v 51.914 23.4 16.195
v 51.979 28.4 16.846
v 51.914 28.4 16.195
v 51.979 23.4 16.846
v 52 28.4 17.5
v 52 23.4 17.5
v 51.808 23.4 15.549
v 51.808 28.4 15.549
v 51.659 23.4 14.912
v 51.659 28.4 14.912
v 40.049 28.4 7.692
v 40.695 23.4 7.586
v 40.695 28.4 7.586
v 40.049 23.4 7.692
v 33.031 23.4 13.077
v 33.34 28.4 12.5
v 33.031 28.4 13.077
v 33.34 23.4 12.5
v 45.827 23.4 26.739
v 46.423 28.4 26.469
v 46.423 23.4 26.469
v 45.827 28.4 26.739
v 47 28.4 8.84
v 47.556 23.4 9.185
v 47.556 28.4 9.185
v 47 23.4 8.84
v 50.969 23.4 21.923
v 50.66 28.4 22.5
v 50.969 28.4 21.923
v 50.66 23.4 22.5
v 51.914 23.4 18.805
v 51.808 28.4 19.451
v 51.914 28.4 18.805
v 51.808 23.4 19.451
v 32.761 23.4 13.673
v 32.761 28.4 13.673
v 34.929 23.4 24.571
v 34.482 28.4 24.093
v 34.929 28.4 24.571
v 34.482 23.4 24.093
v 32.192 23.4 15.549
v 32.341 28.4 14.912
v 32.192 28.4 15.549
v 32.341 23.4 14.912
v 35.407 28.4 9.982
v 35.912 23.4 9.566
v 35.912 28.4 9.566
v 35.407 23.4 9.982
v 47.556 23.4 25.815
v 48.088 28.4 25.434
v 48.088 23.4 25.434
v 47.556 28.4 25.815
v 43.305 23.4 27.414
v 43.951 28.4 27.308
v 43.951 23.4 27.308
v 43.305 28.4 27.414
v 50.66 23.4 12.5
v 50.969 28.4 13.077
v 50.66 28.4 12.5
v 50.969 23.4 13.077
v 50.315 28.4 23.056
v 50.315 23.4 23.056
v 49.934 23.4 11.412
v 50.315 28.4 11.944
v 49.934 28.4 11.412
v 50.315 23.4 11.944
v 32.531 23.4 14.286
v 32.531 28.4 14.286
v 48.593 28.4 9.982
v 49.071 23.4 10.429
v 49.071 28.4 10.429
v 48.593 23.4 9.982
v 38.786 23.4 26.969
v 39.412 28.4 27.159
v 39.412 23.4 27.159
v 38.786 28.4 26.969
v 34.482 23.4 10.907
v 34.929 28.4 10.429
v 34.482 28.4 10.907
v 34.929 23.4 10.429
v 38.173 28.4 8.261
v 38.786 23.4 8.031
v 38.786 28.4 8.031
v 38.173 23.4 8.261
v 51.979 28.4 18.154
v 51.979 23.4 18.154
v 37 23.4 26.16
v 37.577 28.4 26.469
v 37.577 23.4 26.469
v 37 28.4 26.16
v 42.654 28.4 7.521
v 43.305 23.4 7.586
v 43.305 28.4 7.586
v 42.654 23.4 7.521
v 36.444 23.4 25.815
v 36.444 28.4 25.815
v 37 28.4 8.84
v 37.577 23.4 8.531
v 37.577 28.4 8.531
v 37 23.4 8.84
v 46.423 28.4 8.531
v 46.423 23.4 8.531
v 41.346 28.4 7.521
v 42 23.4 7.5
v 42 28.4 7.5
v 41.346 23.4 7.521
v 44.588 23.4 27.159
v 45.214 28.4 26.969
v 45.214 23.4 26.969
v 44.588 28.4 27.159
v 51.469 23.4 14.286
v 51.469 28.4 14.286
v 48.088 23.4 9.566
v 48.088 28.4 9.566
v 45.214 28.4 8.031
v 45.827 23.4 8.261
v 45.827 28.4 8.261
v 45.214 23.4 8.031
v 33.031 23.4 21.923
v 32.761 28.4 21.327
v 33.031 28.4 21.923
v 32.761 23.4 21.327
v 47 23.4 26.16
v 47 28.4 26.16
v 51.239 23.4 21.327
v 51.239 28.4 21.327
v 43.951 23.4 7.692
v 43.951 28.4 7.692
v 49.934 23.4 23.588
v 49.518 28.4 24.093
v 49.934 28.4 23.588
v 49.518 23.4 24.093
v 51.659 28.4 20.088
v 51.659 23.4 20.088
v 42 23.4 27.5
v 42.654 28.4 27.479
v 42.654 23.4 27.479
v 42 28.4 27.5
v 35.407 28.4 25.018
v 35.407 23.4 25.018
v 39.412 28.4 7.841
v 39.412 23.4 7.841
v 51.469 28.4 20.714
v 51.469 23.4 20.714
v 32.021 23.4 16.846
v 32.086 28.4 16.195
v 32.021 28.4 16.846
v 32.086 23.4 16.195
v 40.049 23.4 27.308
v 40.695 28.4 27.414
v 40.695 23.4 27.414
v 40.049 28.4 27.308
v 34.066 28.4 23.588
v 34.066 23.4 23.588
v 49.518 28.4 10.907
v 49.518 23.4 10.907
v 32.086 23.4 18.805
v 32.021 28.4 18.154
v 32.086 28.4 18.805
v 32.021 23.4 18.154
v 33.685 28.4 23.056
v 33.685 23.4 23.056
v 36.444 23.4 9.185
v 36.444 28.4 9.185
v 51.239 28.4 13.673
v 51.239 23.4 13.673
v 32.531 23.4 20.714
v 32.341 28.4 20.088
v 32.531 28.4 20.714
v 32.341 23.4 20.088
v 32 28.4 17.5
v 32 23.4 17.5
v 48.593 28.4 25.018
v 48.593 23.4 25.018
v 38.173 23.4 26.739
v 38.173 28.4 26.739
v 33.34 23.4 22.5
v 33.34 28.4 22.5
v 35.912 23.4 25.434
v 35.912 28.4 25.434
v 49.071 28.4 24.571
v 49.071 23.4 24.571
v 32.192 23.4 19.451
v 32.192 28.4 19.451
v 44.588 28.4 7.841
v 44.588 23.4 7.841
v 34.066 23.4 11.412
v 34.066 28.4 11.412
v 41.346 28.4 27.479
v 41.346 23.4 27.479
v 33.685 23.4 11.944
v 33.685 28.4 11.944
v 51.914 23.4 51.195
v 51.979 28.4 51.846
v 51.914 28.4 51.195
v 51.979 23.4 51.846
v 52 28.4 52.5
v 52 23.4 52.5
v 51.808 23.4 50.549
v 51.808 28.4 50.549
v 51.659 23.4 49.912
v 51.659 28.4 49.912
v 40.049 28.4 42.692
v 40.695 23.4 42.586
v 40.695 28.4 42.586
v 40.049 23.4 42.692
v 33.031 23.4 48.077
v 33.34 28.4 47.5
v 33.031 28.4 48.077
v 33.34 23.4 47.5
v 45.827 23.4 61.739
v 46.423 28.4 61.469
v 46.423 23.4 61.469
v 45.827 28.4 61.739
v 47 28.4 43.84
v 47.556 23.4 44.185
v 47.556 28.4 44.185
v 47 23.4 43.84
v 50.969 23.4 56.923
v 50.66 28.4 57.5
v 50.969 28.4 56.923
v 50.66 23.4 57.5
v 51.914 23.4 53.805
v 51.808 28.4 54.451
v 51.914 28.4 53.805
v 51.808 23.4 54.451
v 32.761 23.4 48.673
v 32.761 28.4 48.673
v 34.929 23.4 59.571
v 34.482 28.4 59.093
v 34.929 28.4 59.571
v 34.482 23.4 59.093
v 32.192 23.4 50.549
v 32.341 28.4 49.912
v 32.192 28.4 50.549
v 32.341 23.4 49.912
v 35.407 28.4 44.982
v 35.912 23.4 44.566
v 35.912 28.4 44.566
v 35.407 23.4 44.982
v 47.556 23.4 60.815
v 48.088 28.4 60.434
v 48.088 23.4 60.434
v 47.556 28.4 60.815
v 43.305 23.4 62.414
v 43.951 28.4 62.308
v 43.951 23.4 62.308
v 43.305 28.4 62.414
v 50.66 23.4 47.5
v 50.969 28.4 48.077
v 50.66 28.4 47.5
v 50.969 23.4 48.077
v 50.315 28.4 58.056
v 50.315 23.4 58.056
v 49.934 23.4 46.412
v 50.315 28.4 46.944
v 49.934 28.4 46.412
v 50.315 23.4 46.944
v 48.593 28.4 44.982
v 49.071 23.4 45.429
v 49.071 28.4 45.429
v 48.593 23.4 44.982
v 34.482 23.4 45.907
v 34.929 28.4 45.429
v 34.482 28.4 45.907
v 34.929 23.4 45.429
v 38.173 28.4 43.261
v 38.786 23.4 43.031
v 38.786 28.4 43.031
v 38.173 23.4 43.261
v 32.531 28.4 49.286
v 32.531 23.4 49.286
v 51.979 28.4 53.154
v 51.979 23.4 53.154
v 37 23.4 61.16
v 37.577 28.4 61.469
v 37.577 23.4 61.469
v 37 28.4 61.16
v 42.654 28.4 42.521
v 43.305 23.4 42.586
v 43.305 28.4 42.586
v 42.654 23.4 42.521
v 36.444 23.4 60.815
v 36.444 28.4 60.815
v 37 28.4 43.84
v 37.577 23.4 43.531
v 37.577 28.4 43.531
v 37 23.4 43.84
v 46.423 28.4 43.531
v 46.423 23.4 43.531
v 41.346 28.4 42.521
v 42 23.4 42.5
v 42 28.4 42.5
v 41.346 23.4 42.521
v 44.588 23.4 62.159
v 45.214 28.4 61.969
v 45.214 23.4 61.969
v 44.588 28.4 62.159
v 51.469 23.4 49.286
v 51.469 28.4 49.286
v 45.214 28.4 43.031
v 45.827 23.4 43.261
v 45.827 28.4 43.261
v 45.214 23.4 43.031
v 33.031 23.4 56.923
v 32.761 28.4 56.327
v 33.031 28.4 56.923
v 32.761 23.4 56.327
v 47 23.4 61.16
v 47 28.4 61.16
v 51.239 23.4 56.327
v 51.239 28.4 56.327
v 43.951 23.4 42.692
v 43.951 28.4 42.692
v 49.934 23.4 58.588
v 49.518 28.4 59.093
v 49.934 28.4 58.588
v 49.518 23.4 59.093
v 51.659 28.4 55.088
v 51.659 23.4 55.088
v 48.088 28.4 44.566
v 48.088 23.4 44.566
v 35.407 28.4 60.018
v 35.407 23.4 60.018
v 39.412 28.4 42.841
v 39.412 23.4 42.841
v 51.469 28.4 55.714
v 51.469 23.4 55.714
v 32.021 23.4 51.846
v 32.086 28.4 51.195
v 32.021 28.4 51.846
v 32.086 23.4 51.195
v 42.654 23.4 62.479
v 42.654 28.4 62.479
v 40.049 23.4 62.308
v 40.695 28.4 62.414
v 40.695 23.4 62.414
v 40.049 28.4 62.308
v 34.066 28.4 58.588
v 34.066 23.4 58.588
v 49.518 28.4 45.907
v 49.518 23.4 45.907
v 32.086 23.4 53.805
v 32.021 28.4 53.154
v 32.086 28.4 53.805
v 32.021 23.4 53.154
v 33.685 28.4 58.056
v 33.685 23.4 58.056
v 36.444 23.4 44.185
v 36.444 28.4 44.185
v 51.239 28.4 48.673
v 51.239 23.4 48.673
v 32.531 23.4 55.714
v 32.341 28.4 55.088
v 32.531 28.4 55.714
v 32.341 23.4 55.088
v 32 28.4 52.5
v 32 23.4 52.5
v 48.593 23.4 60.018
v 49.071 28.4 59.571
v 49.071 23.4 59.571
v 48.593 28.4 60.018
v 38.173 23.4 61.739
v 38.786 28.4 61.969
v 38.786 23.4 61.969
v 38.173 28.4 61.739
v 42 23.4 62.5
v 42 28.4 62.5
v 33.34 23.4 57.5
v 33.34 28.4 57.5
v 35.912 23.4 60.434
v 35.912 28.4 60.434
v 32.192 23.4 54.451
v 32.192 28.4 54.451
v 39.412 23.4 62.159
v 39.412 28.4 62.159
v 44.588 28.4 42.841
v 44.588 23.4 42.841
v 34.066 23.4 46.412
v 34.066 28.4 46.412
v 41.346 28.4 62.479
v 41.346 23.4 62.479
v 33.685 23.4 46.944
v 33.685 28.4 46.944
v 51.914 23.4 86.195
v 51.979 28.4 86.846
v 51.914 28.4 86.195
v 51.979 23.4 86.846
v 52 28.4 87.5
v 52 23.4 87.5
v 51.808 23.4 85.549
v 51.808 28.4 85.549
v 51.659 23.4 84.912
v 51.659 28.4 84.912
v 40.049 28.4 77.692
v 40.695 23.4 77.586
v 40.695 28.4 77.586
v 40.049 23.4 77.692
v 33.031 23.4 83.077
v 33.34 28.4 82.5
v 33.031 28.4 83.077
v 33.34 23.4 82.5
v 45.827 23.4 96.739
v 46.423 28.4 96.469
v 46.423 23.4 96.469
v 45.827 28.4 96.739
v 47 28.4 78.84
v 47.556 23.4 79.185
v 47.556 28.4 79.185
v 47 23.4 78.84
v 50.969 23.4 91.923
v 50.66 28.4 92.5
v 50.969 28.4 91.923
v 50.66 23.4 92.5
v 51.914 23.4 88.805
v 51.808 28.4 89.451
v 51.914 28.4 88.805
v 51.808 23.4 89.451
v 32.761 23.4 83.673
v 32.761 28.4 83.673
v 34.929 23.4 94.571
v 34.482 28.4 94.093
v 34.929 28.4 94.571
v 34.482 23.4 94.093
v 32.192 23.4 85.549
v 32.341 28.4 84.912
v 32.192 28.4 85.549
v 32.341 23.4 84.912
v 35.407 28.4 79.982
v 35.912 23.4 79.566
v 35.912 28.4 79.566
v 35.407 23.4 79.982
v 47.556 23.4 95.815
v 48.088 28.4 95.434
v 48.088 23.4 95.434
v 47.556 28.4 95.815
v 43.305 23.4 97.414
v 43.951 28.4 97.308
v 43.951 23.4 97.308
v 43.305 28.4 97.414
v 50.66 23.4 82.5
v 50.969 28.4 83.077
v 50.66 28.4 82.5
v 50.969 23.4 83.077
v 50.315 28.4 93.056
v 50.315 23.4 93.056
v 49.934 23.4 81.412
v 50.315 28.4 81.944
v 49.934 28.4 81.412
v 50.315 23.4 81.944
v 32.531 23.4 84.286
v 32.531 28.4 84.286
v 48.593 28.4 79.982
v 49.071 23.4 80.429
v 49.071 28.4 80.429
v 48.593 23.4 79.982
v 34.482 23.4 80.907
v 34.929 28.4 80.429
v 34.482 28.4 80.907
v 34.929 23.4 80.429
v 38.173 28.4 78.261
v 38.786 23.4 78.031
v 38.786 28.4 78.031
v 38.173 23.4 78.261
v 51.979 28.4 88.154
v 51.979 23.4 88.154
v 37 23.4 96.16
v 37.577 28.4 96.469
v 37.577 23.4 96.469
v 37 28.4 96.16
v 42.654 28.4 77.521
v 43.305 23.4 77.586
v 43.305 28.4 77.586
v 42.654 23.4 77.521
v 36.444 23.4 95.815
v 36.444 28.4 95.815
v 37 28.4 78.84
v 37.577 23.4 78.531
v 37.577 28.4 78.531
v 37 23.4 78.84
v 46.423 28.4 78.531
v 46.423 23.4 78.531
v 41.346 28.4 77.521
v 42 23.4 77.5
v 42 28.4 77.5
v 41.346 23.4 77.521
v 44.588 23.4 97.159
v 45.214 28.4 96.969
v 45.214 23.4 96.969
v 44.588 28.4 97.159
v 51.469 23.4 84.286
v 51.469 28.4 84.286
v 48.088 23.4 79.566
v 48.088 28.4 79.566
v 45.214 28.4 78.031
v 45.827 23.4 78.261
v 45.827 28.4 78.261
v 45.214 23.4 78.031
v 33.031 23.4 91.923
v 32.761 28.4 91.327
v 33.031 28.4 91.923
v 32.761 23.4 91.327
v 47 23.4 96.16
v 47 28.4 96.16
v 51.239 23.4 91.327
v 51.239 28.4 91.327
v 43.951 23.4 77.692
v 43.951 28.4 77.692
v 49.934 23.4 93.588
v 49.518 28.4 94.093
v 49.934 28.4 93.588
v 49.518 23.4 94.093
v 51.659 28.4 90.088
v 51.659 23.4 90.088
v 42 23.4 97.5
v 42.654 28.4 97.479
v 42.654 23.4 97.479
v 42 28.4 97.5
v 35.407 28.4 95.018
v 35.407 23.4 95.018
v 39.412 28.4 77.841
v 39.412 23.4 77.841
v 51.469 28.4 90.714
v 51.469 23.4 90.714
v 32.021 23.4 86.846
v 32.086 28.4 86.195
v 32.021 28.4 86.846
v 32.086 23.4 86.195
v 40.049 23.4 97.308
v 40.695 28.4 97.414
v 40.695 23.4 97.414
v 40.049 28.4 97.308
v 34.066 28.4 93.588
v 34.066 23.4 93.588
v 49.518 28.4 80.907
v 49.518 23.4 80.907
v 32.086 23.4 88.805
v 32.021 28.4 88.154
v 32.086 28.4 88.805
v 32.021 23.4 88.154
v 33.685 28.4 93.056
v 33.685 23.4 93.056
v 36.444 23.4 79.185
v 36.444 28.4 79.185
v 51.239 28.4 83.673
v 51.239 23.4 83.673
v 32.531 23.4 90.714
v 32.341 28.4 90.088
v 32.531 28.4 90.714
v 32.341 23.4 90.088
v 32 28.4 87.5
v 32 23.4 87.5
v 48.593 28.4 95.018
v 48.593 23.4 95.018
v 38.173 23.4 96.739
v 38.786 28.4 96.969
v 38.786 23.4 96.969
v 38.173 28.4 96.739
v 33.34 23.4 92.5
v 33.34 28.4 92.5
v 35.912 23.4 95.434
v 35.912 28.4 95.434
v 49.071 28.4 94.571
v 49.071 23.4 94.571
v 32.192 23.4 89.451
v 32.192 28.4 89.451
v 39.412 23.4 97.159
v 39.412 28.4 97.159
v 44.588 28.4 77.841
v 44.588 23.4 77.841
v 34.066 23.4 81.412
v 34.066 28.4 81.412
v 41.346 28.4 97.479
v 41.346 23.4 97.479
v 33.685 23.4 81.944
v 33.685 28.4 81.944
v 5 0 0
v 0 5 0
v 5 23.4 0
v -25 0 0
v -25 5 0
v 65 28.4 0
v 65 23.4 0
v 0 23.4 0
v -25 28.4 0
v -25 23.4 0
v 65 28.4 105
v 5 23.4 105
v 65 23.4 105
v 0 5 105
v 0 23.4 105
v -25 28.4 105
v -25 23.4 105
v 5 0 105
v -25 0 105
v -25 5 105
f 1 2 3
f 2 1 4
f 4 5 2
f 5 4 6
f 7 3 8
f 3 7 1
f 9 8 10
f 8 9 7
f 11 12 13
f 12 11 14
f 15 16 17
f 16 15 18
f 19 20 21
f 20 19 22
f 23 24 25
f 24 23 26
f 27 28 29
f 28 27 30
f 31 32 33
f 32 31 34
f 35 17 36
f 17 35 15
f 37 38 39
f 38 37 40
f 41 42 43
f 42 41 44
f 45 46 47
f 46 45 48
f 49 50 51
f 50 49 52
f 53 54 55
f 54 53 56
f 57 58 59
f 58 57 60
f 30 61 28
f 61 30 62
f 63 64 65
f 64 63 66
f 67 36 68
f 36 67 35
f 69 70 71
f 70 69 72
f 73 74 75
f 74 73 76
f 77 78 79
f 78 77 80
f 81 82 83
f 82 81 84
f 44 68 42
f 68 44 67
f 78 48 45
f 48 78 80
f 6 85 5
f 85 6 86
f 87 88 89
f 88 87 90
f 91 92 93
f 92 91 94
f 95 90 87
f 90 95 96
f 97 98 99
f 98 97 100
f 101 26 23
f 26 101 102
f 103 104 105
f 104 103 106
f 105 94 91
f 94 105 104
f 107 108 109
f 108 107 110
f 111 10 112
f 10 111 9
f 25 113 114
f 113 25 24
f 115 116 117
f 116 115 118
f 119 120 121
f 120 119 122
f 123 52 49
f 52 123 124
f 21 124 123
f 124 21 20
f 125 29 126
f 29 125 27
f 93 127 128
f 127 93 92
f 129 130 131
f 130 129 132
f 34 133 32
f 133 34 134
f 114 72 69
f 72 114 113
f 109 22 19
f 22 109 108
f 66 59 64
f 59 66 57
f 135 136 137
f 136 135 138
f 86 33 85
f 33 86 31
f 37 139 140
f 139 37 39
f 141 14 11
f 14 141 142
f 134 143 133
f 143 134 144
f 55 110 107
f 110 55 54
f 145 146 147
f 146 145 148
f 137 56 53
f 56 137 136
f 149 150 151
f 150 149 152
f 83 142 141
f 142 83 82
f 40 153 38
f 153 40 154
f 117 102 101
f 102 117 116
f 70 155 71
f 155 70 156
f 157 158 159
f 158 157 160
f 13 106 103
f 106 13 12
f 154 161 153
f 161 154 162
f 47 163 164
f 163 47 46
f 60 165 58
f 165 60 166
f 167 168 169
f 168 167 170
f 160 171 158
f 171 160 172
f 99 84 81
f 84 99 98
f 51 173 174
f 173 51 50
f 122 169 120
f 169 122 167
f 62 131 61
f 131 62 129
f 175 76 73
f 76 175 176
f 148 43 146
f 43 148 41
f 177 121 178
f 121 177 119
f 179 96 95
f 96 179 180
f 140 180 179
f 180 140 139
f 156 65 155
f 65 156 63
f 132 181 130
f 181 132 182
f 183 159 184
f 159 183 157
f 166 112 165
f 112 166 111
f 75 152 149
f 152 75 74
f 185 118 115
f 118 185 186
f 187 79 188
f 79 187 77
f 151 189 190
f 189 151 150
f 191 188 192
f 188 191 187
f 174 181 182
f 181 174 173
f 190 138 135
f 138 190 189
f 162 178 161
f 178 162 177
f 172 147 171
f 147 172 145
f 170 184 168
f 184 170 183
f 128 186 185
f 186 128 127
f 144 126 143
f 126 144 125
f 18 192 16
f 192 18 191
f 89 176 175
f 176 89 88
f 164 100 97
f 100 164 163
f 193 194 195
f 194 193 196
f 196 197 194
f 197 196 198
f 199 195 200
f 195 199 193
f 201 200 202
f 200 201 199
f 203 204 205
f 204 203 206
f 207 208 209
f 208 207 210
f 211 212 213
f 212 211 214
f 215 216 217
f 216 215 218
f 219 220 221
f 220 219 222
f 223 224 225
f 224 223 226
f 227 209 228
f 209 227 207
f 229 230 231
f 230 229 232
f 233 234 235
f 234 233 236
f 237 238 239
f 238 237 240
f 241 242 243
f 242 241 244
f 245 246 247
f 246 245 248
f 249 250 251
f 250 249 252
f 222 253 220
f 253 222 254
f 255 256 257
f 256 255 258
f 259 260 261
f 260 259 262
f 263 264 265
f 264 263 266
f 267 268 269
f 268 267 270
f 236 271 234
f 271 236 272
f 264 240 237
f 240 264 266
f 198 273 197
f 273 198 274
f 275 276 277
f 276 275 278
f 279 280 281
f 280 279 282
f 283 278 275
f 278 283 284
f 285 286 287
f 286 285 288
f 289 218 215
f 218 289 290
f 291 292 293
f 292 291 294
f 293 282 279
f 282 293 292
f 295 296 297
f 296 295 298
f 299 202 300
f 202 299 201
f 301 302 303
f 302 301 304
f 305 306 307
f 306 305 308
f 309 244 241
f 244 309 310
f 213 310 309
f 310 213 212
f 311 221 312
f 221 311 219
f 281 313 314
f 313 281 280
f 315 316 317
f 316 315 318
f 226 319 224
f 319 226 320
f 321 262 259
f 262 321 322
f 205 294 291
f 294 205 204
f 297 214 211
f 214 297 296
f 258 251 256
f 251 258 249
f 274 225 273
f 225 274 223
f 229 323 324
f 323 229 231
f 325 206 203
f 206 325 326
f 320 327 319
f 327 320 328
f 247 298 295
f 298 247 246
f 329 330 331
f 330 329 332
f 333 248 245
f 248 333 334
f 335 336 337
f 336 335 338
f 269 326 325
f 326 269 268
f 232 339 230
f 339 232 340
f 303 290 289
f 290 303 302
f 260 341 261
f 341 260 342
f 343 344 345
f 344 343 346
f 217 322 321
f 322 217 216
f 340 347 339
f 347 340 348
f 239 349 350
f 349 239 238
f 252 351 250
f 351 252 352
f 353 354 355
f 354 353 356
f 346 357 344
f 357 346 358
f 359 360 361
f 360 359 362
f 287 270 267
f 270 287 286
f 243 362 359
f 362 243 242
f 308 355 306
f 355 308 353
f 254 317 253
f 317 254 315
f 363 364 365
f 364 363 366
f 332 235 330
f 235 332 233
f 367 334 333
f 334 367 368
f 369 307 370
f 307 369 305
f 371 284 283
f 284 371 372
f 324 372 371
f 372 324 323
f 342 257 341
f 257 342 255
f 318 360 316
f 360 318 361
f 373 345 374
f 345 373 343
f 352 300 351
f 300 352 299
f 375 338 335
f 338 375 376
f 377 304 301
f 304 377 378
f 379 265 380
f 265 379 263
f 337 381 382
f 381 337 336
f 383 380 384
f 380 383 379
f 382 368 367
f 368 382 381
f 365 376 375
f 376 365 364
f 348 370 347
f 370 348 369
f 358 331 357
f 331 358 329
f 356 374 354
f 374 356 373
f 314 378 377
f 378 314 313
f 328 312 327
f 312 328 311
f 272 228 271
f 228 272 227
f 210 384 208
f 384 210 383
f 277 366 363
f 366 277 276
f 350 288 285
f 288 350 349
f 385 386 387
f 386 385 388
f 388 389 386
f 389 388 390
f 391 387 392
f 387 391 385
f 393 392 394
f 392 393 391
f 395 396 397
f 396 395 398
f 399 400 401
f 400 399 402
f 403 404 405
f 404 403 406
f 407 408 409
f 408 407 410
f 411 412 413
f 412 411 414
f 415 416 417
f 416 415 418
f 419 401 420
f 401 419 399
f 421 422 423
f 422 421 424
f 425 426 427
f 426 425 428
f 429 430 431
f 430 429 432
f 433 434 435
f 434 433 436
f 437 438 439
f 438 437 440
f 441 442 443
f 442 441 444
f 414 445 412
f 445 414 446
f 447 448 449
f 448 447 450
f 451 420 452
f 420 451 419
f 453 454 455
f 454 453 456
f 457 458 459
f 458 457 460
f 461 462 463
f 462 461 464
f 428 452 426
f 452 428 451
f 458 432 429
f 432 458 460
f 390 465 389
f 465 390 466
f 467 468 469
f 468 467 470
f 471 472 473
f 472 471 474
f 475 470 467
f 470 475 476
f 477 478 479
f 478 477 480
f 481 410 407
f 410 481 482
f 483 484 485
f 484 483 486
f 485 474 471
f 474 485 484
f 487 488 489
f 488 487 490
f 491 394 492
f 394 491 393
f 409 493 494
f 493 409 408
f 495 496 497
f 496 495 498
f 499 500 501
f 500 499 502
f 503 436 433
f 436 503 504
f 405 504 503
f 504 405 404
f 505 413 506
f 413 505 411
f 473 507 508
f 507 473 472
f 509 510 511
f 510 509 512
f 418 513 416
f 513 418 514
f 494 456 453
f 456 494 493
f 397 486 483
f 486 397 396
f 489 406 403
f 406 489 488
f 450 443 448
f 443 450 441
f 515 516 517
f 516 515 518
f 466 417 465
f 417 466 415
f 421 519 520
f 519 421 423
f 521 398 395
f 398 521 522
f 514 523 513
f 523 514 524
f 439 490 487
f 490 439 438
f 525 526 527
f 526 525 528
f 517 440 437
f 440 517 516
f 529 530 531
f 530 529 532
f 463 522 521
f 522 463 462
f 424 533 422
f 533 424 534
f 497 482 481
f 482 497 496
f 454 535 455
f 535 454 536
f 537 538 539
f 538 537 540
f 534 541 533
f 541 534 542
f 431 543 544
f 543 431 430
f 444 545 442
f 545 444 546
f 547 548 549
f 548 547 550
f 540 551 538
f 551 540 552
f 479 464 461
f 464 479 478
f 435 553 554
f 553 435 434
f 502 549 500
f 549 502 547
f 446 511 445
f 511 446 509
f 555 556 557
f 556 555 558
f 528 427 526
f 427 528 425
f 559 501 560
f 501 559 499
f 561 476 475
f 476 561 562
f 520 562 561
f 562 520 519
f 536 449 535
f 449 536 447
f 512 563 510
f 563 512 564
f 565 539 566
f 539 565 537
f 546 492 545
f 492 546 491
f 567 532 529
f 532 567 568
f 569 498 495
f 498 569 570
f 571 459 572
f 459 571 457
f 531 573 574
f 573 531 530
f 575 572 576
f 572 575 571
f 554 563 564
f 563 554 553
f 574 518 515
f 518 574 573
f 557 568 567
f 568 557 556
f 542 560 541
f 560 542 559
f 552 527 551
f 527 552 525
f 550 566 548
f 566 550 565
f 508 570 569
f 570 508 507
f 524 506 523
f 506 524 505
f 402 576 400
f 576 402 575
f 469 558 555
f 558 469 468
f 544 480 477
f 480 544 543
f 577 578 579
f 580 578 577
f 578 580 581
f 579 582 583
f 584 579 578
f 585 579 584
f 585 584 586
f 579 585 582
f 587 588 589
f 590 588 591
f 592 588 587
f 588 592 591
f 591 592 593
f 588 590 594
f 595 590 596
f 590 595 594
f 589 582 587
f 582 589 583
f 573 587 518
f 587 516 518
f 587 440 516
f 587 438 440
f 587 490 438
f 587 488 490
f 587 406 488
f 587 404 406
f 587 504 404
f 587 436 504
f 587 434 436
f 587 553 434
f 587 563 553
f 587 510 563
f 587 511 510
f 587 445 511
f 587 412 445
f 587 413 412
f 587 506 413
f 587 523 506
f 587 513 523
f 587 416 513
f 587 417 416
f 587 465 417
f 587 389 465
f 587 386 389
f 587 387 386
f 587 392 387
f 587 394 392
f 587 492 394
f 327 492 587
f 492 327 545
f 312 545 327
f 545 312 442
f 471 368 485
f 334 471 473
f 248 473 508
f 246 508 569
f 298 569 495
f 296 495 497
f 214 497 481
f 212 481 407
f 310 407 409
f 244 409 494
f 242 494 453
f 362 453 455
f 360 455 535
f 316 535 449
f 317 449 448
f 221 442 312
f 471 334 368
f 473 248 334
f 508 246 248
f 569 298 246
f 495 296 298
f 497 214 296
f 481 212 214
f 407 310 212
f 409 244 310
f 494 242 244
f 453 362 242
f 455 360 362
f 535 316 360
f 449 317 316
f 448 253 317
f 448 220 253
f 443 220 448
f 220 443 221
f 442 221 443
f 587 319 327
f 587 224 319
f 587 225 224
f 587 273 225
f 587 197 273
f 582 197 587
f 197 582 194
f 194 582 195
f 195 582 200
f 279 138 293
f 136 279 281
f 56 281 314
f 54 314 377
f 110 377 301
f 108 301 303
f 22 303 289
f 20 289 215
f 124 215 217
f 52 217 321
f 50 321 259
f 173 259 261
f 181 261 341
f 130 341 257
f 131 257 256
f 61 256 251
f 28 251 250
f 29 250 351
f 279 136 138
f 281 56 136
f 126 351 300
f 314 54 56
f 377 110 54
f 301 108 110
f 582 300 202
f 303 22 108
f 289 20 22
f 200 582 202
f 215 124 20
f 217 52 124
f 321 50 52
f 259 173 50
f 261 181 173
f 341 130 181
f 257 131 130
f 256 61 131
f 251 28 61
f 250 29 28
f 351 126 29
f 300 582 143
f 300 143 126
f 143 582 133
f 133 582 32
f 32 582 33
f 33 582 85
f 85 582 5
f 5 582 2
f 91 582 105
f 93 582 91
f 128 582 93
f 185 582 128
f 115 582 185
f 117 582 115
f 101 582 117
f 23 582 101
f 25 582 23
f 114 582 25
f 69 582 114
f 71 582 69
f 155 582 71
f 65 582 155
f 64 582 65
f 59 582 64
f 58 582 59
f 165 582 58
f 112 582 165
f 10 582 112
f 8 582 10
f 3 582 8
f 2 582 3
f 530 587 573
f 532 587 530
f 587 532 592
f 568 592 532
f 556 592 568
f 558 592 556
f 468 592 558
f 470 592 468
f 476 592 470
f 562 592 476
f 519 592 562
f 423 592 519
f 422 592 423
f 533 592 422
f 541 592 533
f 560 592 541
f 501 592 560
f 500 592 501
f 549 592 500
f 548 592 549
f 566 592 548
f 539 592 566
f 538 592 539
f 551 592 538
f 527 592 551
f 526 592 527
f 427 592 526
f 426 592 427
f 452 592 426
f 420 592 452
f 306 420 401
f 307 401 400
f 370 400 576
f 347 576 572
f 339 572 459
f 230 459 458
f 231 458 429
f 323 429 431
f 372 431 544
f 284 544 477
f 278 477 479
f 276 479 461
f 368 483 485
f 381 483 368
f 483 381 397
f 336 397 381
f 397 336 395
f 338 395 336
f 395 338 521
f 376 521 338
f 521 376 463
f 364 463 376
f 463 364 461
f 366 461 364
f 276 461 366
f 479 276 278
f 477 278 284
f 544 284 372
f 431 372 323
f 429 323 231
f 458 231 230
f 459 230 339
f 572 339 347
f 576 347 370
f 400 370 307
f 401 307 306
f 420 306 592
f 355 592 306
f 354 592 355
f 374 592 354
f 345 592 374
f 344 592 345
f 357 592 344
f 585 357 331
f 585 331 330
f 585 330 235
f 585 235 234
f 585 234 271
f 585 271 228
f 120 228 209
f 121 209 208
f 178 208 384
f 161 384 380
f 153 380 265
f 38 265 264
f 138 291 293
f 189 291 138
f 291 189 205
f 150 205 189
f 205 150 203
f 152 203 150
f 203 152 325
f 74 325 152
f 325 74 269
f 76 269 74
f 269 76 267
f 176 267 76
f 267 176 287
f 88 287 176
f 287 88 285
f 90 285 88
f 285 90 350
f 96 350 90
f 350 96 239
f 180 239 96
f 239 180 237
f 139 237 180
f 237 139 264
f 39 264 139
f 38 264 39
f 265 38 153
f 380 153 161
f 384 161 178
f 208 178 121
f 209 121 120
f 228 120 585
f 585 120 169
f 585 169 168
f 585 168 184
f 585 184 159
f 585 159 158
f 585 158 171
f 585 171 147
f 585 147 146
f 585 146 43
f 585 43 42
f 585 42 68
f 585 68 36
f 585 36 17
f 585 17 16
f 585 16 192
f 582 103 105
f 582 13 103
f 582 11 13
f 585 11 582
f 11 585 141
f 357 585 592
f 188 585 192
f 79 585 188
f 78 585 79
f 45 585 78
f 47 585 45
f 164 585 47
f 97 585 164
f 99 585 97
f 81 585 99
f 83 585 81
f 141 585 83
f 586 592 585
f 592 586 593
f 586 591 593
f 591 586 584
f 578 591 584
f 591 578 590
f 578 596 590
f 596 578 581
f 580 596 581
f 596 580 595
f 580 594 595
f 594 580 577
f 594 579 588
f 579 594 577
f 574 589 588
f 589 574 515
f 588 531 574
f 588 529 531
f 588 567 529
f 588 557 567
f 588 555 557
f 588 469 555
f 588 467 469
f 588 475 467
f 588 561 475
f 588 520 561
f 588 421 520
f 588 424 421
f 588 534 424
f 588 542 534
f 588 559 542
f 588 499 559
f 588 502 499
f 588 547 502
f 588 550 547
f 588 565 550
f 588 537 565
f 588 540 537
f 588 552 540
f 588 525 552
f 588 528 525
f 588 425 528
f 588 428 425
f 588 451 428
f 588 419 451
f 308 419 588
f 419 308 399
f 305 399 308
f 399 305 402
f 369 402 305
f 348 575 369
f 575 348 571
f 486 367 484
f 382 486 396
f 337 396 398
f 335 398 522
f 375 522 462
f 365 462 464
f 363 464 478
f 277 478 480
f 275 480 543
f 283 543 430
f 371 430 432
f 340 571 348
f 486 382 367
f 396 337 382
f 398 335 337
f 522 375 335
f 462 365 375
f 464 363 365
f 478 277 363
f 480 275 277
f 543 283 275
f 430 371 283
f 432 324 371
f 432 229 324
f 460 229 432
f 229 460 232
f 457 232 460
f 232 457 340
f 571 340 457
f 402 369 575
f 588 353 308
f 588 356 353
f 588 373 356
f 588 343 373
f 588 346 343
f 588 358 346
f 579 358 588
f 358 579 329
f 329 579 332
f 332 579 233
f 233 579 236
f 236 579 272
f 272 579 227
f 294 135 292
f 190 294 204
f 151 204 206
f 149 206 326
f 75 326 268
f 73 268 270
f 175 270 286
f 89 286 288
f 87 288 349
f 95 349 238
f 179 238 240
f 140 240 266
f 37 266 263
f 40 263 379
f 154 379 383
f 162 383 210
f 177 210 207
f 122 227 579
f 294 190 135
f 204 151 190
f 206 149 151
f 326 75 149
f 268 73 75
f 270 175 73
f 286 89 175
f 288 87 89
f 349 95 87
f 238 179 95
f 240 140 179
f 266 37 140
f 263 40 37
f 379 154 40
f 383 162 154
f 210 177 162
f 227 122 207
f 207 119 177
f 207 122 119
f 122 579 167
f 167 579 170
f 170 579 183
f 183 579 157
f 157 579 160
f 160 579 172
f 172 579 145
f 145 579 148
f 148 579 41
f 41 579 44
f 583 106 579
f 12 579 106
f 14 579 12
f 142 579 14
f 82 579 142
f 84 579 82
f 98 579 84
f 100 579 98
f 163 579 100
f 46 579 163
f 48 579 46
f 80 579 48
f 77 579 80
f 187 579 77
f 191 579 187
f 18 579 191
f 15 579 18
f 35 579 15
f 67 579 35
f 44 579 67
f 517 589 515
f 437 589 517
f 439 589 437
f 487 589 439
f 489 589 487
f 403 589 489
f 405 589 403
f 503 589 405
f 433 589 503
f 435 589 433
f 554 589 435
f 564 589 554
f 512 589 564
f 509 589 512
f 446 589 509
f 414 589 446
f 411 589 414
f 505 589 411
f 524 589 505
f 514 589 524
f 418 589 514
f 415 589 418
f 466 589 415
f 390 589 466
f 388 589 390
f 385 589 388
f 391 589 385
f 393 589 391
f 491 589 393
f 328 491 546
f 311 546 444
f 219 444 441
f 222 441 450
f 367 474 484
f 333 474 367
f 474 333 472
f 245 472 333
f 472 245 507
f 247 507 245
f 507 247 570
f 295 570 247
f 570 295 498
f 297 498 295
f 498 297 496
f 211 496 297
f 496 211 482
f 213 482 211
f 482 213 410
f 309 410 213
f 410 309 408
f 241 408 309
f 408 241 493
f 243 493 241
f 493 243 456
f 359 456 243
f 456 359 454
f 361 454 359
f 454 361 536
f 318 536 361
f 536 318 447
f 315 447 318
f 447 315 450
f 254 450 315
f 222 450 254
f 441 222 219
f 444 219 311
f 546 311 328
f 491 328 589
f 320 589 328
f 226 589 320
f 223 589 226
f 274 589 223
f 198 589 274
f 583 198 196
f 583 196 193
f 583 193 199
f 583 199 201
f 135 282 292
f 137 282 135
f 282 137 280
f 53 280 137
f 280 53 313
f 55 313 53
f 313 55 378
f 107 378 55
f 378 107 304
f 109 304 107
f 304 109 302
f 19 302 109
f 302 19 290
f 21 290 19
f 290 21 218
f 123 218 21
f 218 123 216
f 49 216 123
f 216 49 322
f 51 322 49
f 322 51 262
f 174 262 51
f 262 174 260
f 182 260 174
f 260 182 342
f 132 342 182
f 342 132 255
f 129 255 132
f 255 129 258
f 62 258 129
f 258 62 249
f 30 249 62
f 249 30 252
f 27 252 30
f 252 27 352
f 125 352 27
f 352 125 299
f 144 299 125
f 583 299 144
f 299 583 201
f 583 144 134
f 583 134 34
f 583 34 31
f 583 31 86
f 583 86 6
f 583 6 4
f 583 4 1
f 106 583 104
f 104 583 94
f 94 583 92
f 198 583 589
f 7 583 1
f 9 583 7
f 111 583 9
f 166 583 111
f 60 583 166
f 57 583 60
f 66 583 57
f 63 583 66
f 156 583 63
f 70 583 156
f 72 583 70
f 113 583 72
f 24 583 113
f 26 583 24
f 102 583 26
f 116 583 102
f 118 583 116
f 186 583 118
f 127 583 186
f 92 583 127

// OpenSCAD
// Shelf-edge clamp holder for 3 single-channel pipettes
// Printed lying on its side: profile in XY, extruded along Z.
// In use: +Y is up, +X points away from the shelf.

$fn = 96;

// ---- Overall ----
length      = 105;    // extrusion length along Z

// ---- Spine ----
spine_x0    = 0;      // spine inner face X
spine_x1    = 5;      // spine outer face X
spine_y0    = 0;      // spine bottom Y
spine_y1    = 28.4;   // spine top Y

// ---- Bottom jaw ----
bjaw_x0     = -25;    // bottom jaw tip X
bjaw_x1     = 5;      // bottom jaw end X (joins spine)
bjaw_y0     = 0;      // bottom jaw bottom Y
bjaw_y1     = 5;      // bottom jaw top Y

// ---- Top jaw + arm ----
arm_x0      = -25;    // top jaw tip X
arm_x1      = 65;     // arm front end X
arm_y0      = 23.4;   // top jaw / arm underside Y (18.4 mm shelf gap)
arm_y1      = 28.4;   // top jaw / arm top Y

// ---- Pipette holes ----
hole_d      = 20;                 // pipette hole diameter
hole_x      = 42;                 // hole centre X
hole_z      = [17.5, 52.5, 87.5]; // hole centres along Z
cut_extra   = 1;                  // overshoot for clean cuts

difference() {
    // Clamp body: 2-D profile extruded along Z
    linear_extrude(height = length)
        union() {
            // spine
            translate([spine_x0, spine_y0])
                square([spine_x1 - spine_x0, spine_y1 - spine_y0]);
            // bottom jaw
            translate([bjaw_x0, bjaw_y0])
                square([bjaw_x1 - bjaw_x0, bjaw_y1 - bjaw_y0]);
            // top jaw and forward arm
            translate([arm_x0, arm_y0])
                square([arm_x1 - arm_x0, arm_y1 - arm_y0]);
        }

    // Pipette holes through the arm along Y
    for (z = hole_z)
        translate([hole_x, arm_y0 - cut_extra, z])
            rotate([-90, 0, 0])
                cylinder(d = hole_d, h = (arm_y1 - arm_y0) + 2 * cut_extra);
}
